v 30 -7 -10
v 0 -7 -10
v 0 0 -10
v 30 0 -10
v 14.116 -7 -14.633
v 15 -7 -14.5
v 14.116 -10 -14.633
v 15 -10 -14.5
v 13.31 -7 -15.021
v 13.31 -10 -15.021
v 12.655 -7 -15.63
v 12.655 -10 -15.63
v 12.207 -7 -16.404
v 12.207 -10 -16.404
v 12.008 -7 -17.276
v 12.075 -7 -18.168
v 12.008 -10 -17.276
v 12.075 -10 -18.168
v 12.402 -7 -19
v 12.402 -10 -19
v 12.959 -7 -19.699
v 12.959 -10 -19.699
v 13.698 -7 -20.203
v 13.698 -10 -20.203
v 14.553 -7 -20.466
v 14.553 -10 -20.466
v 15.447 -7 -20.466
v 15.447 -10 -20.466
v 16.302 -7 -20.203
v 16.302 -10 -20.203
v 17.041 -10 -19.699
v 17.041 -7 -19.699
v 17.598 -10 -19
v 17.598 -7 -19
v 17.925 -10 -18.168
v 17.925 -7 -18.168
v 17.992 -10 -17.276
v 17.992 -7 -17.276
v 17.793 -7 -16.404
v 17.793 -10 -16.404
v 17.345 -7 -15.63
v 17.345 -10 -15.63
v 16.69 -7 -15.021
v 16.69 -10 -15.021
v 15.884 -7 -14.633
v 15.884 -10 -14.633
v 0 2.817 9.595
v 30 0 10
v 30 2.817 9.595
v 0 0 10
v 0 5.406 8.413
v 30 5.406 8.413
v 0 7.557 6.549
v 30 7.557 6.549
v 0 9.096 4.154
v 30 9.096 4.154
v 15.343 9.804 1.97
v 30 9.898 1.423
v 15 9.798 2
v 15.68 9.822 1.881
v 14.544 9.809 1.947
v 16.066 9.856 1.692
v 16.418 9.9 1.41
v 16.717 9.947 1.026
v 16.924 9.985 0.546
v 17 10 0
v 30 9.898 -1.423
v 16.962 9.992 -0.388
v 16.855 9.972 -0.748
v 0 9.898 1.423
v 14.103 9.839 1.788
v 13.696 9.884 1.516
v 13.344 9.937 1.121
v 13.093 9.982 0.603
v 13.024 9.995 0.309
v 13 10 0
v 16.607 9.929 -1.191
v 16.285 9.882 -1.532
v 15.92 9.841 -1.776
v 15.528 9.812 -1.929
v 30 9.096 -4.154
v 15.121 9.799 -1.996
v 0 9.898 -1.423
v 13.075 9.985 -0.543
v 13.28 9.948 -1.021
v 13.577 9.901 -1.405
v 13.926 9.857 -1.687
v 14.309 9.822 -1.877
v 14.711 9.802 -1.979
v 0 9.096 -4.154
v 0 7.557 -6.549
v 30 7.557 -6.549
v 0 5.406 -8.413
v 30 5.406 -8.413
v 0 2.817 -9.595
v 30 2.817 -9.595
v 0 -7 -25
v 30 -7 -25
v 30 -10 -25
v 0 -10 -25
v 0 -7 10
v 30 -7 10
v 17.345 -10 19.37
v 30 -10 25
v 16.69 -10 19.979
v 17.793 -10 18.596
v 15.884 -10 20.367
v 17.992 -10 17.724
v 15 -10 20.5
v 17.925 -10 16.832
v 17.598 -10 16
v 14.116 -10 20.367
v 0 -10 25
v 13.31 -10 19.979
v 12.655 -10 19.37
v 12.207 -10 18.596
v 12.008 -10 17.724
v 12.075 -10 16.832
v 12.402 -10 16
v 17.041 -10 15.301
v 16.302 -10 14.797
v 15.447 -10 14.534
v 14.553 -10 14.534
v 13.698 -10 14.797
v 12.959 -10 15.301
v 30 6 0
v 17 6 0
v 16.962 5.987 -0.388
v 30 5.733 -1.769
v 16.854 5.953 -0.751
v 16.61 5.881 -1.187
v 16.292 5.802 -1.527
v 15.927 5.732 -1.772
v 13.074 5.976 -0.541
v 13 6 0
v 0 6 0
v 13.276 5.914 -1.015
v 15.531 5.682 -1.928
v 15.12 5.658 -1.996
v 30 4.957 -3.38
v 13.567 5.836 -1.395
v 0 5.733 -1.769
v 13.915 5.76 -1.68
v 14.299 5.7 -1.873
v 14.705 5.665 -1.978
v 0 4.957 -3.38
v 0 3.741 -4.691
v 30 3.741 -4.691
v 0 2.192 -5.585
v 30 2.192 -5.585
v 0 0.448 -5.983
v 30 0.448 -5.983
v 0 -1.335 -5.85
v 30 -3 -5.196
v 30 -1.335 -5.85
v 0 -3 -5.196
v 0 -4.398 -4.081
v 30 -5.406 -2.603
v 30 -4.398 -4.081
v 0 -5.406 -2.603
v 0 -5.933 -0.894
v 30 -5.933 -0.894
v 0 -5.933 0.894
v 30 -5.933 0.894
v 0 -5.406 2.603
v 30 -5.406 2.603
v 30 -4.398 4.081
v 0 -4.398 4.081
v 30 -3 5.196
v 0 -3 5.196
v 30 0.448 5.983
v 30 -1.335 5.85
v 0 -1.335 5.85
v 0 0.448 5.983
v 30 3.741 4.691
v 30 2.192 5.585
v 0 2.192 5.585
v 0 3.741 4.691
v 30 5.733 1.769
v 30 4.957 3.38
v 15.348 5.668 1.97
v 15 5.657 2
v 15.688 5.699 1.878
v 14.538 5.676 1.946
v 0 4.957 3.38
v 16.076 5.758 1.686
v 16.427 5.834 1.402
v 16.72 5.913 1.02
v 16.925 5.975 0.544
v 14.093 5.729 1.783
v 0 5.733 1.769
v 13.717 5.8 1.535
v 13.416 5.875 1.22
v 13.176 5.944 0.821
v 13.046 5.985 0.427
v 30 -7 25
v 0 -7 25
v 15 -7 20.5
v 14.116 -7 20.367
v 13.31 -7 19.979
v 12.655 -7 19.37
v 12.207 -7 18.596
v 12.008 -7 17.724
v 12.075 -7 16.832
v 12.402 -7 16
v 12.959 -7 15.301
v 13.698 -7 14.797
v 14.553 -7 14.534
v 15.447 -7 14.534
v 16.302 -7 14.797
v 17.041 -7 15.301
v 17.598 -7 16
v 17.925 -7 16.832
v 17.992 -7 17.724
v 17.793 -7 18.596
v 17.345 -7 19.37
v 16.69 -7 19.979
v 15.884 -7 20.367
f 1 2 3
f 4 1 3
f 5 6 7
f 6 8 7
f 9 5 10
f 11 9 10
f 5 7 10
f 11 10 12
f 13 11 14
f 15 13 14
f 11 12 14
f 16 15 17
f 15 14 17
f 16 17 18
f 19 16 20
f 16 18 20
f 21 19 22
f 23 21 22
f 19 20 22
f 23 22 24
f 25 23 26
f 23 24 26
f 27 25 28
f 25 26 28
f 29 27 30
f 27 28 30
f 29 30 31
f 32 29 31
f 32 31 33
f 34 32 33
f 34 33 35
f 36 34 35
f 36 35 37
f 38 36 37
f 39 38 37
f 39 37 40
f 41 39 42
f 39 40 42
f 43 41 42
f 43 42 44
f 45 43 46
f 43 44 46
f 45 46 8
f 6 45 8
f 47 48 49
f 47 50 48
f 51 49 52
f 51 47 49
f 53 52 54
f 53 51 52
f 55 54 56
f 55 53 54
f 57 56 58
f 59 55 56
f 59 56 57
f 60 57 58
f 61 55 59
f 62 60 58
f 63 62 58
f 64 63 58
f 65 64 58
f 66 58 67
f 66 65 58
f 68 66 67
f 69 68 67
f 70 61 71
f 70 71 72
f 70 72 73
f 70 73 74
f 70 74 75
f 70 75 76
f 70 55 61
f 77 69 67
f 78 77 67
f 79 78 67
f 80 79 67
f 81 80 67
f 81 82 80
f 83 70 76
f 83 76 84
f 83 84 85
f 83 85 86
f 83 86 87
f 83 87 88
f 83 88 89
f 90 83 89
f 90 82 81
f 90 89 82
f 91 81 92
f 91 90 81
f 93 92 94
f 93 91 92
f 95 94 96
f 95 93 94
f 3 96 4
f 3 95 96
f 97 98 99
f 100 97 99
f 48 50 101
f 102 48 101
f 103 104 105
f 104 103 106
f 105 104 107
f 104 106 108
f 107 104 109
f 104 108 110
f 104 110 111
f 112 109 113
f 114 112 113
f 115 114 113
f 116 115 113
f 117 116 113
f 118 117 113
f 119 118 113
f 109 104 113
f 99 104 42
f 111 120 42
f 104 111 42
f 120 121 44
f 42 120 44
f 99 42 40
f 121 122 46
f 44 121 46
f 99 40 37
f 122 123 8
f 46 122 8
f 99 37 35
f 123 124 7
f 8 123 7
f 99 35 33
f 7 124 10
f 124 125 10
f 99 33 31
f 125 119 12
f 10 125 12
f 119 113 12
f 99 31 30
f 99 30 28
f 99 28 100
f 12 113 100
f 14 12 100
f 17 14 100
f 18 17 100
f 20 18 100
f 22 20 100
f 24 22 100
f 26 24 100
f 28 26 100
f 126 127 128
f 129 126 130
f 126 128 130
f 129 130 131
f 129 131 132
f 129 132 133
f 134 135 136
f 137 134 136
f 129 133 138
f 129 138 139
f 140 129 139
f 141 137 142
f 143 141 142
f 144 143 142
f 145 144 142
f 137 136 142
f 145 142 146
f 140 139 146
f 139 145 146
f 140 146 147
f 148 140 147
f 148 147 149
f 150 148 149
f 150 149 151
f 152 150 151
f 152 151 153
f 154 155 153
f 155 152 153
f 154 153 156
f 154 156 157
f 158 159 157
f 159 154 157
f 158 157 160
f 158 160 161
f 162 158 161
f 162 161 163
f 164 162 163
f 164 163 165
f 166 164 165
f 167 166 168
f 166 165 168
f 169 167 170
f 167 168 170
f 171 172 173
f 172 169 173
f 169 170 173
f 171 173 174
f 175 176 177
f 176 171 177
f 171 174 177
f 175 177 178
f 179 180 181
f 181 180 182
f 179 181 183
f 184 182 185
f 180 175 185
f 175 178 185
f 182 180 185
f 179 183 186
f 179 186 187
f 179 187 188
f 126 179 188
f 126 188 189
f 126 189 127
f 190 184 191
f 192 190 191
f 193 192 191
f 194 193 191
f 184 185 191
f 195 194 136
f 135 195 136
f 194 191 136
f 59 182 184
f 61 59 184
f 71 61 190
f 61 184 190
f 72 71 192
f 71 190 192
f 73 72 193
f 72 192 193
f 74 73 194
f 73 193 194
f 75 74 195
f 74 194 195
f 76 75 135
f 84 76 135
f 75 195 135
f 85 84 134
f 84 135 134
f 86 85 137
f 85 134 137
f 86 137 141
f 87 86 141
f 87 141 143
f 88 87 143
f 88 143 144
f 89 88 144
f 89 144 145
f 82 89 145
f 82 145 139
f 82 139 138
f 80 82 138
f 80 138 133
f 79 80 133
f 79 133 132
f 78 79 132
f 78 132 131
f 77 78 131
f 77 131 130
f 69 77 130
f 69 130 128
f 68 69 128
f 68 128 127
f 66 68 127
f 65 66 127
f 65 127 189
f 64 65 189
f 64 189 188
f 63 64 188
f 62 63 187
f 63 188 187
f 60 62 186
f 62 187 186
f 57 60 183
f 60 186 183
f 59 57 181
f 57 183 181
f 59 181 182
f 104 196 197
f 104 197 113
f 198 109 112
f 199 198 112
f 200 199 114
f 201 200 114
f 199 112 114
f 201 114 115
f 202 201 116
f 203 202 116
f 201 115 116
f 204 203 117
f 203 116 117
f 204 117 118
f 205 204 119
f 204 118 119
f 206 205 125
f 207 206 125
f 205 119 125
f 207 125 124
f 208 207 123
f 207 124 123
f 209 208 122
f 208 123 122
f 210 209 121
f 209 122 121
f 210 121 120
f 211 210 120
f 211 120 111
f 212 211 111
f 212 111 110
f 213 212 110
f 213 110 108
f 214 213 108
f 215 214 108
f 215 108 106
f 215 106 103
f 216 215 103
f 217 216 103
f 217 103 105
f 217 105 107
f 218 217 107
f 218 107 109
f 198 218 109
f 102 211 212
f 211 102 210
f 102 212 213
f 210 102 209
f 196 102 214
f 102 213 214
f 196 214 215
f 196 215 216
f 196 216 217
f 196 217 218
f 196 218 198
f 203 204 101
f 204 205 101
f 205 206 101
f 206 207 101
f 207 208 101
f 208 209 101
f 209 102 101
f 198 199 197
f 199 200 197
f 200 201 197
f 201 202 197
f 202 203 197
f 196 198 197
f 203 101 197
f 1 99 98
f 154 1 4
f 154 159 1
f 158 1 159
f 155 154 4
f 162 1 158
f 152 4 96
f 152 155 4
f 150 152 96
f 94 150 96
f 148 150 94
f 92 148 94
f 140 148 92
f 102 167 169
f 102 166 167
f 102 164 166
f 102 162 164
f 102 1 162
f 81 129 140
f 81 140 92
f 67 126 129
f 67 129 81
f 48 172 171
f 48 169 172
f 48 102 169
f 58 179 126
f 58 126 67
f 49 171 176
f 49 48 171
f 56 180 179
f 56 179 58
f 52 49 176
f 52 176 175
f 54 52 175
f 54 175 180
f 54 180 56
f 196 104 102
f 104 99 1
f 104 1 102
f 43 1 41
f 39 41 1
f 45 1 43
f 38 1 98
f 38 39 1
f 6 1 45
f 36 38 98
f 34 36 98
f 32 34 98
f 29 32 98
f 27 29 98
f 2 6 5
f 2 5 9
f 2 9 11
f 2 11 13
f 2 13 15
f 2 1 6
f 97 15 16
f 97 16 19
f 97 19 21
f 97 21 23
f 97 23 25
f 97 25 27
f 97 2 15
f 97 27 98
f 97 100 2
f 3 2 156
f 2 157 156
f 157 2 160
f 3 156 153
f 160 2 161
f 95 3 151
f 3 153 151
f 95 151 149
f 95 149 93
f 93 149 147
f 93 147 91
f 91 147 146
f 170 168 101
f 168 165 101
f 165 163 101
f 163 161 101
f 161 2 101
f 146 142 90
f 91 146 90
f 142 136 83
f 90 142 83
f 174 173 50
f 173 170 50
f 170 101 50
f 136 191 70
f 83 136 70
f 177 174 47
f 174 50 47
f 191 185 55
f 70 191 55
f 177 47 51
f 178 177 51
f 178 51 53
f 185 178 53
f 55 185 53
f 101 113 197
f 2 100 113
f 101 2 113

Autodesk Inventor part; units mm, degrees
ref_plane "YZ Plane" through (0, 0, 0) normal (1, 0, 0) x (0, 1, 0)
ref_plane "XZ Plane" through (0, 0, 0) normal (0, 1, 0) x (-1, 0, 0)
sketch "Sketch1" plane through (0, 0, 0) normal (1, 0, 0) x (0, 1, 0)
  circle A0 centre (0, 0) radius 6
  circle A1 centre (0, 0) radius 10
  line L0 (0, 10) -> (-10, 10)
  line L1 (-10, 10) -> (-10, -10)
  line L2 (-10, -10) -> (0, -10)
  line L3 (-10, -10) -> (-7, -10)
  line L4 (-7, -10) -> (-7, -25)
  line L5 (-7, -25) -> (-10, -25)
  line L6 (-10, -25) -> (-10, -10)
  line L7 (-10, 10) -> (-7, 10)
  line L8 (-7, 10) -> (-7, 25)
  line L9 (-7, 25) -> (-10, 25)
  line L10 (-10, 25) -> (-10, 10)
  dimension "d0" = 12
  dimension "d1" = 20
  dimension "d2" = 3
  dimension "d3" = 15
  dimension "d4" = 3
  dimension "d5" = 15
extrude "Extrusion1" add sketch "Sketch1" along normal blind 30
sketch "Sketch2" plane through (0, -7, 25) normal (0, 1, 0) x (1, 0, 0)
  line L0 (0, 0) -> (30, 0) projected
  line L1 (0, 0) -> (15, 0)
  line L2 (15, 0) -> (15, 7.5)
  line L3 (15, 7.5) -> (0, 7.5)
  line L4 (0, 7.5) -> (0, 0)
  line L5 (30, 0) -> (30, 50) projected
  line L6 (30, 50) -> (15, 50)
  line L7 (15, 50) -> (15, 42.5)
  line L8 (15, 42.5) -> (30, 42.5)
  line L9 (30, 42.5) -> (30, 50)
  circle A0 centre (15, 7.5) radius 3
  circle A1 centre (15, 42.5) radius 3
  point P0 (0, 25)
  dimension "d8" = 15
  dimension "d9" = 7.5
  dimension "d10" = 15
  dimension "d11" = 7.5
  dimension "d12" = 6
  dimension "d13" = 6
ref_plane "Work Plane1" through (0, 10, 0) normal (0, 1, 0) x (1, 0, 0)
sketch "Sketch3" plane through (0, 10, 0) normal (0, 1, 0) x (1, 0, 0)
  line L0 (0, 0) -> (15, 0)
  circle A0 centre (15, 0) radius 2
  dimension "d14" = 15
  dimension "d15" = 4
hole "Hole1" at (15, 10, 0) direction (0, -1, 0) diameter 4 depth 8 tip angle 118
thread "Thread1" size "M4x0.7" class "6H" standard "ANSI Metric M Profile" full length
hole "Hole2" at (15, -7, 17.5) at (15, -7, -17.5) direction (0, -1, 0) diameter 6 end through all
properties part number "base_axis_static_12mm" material "PET Plastic"
